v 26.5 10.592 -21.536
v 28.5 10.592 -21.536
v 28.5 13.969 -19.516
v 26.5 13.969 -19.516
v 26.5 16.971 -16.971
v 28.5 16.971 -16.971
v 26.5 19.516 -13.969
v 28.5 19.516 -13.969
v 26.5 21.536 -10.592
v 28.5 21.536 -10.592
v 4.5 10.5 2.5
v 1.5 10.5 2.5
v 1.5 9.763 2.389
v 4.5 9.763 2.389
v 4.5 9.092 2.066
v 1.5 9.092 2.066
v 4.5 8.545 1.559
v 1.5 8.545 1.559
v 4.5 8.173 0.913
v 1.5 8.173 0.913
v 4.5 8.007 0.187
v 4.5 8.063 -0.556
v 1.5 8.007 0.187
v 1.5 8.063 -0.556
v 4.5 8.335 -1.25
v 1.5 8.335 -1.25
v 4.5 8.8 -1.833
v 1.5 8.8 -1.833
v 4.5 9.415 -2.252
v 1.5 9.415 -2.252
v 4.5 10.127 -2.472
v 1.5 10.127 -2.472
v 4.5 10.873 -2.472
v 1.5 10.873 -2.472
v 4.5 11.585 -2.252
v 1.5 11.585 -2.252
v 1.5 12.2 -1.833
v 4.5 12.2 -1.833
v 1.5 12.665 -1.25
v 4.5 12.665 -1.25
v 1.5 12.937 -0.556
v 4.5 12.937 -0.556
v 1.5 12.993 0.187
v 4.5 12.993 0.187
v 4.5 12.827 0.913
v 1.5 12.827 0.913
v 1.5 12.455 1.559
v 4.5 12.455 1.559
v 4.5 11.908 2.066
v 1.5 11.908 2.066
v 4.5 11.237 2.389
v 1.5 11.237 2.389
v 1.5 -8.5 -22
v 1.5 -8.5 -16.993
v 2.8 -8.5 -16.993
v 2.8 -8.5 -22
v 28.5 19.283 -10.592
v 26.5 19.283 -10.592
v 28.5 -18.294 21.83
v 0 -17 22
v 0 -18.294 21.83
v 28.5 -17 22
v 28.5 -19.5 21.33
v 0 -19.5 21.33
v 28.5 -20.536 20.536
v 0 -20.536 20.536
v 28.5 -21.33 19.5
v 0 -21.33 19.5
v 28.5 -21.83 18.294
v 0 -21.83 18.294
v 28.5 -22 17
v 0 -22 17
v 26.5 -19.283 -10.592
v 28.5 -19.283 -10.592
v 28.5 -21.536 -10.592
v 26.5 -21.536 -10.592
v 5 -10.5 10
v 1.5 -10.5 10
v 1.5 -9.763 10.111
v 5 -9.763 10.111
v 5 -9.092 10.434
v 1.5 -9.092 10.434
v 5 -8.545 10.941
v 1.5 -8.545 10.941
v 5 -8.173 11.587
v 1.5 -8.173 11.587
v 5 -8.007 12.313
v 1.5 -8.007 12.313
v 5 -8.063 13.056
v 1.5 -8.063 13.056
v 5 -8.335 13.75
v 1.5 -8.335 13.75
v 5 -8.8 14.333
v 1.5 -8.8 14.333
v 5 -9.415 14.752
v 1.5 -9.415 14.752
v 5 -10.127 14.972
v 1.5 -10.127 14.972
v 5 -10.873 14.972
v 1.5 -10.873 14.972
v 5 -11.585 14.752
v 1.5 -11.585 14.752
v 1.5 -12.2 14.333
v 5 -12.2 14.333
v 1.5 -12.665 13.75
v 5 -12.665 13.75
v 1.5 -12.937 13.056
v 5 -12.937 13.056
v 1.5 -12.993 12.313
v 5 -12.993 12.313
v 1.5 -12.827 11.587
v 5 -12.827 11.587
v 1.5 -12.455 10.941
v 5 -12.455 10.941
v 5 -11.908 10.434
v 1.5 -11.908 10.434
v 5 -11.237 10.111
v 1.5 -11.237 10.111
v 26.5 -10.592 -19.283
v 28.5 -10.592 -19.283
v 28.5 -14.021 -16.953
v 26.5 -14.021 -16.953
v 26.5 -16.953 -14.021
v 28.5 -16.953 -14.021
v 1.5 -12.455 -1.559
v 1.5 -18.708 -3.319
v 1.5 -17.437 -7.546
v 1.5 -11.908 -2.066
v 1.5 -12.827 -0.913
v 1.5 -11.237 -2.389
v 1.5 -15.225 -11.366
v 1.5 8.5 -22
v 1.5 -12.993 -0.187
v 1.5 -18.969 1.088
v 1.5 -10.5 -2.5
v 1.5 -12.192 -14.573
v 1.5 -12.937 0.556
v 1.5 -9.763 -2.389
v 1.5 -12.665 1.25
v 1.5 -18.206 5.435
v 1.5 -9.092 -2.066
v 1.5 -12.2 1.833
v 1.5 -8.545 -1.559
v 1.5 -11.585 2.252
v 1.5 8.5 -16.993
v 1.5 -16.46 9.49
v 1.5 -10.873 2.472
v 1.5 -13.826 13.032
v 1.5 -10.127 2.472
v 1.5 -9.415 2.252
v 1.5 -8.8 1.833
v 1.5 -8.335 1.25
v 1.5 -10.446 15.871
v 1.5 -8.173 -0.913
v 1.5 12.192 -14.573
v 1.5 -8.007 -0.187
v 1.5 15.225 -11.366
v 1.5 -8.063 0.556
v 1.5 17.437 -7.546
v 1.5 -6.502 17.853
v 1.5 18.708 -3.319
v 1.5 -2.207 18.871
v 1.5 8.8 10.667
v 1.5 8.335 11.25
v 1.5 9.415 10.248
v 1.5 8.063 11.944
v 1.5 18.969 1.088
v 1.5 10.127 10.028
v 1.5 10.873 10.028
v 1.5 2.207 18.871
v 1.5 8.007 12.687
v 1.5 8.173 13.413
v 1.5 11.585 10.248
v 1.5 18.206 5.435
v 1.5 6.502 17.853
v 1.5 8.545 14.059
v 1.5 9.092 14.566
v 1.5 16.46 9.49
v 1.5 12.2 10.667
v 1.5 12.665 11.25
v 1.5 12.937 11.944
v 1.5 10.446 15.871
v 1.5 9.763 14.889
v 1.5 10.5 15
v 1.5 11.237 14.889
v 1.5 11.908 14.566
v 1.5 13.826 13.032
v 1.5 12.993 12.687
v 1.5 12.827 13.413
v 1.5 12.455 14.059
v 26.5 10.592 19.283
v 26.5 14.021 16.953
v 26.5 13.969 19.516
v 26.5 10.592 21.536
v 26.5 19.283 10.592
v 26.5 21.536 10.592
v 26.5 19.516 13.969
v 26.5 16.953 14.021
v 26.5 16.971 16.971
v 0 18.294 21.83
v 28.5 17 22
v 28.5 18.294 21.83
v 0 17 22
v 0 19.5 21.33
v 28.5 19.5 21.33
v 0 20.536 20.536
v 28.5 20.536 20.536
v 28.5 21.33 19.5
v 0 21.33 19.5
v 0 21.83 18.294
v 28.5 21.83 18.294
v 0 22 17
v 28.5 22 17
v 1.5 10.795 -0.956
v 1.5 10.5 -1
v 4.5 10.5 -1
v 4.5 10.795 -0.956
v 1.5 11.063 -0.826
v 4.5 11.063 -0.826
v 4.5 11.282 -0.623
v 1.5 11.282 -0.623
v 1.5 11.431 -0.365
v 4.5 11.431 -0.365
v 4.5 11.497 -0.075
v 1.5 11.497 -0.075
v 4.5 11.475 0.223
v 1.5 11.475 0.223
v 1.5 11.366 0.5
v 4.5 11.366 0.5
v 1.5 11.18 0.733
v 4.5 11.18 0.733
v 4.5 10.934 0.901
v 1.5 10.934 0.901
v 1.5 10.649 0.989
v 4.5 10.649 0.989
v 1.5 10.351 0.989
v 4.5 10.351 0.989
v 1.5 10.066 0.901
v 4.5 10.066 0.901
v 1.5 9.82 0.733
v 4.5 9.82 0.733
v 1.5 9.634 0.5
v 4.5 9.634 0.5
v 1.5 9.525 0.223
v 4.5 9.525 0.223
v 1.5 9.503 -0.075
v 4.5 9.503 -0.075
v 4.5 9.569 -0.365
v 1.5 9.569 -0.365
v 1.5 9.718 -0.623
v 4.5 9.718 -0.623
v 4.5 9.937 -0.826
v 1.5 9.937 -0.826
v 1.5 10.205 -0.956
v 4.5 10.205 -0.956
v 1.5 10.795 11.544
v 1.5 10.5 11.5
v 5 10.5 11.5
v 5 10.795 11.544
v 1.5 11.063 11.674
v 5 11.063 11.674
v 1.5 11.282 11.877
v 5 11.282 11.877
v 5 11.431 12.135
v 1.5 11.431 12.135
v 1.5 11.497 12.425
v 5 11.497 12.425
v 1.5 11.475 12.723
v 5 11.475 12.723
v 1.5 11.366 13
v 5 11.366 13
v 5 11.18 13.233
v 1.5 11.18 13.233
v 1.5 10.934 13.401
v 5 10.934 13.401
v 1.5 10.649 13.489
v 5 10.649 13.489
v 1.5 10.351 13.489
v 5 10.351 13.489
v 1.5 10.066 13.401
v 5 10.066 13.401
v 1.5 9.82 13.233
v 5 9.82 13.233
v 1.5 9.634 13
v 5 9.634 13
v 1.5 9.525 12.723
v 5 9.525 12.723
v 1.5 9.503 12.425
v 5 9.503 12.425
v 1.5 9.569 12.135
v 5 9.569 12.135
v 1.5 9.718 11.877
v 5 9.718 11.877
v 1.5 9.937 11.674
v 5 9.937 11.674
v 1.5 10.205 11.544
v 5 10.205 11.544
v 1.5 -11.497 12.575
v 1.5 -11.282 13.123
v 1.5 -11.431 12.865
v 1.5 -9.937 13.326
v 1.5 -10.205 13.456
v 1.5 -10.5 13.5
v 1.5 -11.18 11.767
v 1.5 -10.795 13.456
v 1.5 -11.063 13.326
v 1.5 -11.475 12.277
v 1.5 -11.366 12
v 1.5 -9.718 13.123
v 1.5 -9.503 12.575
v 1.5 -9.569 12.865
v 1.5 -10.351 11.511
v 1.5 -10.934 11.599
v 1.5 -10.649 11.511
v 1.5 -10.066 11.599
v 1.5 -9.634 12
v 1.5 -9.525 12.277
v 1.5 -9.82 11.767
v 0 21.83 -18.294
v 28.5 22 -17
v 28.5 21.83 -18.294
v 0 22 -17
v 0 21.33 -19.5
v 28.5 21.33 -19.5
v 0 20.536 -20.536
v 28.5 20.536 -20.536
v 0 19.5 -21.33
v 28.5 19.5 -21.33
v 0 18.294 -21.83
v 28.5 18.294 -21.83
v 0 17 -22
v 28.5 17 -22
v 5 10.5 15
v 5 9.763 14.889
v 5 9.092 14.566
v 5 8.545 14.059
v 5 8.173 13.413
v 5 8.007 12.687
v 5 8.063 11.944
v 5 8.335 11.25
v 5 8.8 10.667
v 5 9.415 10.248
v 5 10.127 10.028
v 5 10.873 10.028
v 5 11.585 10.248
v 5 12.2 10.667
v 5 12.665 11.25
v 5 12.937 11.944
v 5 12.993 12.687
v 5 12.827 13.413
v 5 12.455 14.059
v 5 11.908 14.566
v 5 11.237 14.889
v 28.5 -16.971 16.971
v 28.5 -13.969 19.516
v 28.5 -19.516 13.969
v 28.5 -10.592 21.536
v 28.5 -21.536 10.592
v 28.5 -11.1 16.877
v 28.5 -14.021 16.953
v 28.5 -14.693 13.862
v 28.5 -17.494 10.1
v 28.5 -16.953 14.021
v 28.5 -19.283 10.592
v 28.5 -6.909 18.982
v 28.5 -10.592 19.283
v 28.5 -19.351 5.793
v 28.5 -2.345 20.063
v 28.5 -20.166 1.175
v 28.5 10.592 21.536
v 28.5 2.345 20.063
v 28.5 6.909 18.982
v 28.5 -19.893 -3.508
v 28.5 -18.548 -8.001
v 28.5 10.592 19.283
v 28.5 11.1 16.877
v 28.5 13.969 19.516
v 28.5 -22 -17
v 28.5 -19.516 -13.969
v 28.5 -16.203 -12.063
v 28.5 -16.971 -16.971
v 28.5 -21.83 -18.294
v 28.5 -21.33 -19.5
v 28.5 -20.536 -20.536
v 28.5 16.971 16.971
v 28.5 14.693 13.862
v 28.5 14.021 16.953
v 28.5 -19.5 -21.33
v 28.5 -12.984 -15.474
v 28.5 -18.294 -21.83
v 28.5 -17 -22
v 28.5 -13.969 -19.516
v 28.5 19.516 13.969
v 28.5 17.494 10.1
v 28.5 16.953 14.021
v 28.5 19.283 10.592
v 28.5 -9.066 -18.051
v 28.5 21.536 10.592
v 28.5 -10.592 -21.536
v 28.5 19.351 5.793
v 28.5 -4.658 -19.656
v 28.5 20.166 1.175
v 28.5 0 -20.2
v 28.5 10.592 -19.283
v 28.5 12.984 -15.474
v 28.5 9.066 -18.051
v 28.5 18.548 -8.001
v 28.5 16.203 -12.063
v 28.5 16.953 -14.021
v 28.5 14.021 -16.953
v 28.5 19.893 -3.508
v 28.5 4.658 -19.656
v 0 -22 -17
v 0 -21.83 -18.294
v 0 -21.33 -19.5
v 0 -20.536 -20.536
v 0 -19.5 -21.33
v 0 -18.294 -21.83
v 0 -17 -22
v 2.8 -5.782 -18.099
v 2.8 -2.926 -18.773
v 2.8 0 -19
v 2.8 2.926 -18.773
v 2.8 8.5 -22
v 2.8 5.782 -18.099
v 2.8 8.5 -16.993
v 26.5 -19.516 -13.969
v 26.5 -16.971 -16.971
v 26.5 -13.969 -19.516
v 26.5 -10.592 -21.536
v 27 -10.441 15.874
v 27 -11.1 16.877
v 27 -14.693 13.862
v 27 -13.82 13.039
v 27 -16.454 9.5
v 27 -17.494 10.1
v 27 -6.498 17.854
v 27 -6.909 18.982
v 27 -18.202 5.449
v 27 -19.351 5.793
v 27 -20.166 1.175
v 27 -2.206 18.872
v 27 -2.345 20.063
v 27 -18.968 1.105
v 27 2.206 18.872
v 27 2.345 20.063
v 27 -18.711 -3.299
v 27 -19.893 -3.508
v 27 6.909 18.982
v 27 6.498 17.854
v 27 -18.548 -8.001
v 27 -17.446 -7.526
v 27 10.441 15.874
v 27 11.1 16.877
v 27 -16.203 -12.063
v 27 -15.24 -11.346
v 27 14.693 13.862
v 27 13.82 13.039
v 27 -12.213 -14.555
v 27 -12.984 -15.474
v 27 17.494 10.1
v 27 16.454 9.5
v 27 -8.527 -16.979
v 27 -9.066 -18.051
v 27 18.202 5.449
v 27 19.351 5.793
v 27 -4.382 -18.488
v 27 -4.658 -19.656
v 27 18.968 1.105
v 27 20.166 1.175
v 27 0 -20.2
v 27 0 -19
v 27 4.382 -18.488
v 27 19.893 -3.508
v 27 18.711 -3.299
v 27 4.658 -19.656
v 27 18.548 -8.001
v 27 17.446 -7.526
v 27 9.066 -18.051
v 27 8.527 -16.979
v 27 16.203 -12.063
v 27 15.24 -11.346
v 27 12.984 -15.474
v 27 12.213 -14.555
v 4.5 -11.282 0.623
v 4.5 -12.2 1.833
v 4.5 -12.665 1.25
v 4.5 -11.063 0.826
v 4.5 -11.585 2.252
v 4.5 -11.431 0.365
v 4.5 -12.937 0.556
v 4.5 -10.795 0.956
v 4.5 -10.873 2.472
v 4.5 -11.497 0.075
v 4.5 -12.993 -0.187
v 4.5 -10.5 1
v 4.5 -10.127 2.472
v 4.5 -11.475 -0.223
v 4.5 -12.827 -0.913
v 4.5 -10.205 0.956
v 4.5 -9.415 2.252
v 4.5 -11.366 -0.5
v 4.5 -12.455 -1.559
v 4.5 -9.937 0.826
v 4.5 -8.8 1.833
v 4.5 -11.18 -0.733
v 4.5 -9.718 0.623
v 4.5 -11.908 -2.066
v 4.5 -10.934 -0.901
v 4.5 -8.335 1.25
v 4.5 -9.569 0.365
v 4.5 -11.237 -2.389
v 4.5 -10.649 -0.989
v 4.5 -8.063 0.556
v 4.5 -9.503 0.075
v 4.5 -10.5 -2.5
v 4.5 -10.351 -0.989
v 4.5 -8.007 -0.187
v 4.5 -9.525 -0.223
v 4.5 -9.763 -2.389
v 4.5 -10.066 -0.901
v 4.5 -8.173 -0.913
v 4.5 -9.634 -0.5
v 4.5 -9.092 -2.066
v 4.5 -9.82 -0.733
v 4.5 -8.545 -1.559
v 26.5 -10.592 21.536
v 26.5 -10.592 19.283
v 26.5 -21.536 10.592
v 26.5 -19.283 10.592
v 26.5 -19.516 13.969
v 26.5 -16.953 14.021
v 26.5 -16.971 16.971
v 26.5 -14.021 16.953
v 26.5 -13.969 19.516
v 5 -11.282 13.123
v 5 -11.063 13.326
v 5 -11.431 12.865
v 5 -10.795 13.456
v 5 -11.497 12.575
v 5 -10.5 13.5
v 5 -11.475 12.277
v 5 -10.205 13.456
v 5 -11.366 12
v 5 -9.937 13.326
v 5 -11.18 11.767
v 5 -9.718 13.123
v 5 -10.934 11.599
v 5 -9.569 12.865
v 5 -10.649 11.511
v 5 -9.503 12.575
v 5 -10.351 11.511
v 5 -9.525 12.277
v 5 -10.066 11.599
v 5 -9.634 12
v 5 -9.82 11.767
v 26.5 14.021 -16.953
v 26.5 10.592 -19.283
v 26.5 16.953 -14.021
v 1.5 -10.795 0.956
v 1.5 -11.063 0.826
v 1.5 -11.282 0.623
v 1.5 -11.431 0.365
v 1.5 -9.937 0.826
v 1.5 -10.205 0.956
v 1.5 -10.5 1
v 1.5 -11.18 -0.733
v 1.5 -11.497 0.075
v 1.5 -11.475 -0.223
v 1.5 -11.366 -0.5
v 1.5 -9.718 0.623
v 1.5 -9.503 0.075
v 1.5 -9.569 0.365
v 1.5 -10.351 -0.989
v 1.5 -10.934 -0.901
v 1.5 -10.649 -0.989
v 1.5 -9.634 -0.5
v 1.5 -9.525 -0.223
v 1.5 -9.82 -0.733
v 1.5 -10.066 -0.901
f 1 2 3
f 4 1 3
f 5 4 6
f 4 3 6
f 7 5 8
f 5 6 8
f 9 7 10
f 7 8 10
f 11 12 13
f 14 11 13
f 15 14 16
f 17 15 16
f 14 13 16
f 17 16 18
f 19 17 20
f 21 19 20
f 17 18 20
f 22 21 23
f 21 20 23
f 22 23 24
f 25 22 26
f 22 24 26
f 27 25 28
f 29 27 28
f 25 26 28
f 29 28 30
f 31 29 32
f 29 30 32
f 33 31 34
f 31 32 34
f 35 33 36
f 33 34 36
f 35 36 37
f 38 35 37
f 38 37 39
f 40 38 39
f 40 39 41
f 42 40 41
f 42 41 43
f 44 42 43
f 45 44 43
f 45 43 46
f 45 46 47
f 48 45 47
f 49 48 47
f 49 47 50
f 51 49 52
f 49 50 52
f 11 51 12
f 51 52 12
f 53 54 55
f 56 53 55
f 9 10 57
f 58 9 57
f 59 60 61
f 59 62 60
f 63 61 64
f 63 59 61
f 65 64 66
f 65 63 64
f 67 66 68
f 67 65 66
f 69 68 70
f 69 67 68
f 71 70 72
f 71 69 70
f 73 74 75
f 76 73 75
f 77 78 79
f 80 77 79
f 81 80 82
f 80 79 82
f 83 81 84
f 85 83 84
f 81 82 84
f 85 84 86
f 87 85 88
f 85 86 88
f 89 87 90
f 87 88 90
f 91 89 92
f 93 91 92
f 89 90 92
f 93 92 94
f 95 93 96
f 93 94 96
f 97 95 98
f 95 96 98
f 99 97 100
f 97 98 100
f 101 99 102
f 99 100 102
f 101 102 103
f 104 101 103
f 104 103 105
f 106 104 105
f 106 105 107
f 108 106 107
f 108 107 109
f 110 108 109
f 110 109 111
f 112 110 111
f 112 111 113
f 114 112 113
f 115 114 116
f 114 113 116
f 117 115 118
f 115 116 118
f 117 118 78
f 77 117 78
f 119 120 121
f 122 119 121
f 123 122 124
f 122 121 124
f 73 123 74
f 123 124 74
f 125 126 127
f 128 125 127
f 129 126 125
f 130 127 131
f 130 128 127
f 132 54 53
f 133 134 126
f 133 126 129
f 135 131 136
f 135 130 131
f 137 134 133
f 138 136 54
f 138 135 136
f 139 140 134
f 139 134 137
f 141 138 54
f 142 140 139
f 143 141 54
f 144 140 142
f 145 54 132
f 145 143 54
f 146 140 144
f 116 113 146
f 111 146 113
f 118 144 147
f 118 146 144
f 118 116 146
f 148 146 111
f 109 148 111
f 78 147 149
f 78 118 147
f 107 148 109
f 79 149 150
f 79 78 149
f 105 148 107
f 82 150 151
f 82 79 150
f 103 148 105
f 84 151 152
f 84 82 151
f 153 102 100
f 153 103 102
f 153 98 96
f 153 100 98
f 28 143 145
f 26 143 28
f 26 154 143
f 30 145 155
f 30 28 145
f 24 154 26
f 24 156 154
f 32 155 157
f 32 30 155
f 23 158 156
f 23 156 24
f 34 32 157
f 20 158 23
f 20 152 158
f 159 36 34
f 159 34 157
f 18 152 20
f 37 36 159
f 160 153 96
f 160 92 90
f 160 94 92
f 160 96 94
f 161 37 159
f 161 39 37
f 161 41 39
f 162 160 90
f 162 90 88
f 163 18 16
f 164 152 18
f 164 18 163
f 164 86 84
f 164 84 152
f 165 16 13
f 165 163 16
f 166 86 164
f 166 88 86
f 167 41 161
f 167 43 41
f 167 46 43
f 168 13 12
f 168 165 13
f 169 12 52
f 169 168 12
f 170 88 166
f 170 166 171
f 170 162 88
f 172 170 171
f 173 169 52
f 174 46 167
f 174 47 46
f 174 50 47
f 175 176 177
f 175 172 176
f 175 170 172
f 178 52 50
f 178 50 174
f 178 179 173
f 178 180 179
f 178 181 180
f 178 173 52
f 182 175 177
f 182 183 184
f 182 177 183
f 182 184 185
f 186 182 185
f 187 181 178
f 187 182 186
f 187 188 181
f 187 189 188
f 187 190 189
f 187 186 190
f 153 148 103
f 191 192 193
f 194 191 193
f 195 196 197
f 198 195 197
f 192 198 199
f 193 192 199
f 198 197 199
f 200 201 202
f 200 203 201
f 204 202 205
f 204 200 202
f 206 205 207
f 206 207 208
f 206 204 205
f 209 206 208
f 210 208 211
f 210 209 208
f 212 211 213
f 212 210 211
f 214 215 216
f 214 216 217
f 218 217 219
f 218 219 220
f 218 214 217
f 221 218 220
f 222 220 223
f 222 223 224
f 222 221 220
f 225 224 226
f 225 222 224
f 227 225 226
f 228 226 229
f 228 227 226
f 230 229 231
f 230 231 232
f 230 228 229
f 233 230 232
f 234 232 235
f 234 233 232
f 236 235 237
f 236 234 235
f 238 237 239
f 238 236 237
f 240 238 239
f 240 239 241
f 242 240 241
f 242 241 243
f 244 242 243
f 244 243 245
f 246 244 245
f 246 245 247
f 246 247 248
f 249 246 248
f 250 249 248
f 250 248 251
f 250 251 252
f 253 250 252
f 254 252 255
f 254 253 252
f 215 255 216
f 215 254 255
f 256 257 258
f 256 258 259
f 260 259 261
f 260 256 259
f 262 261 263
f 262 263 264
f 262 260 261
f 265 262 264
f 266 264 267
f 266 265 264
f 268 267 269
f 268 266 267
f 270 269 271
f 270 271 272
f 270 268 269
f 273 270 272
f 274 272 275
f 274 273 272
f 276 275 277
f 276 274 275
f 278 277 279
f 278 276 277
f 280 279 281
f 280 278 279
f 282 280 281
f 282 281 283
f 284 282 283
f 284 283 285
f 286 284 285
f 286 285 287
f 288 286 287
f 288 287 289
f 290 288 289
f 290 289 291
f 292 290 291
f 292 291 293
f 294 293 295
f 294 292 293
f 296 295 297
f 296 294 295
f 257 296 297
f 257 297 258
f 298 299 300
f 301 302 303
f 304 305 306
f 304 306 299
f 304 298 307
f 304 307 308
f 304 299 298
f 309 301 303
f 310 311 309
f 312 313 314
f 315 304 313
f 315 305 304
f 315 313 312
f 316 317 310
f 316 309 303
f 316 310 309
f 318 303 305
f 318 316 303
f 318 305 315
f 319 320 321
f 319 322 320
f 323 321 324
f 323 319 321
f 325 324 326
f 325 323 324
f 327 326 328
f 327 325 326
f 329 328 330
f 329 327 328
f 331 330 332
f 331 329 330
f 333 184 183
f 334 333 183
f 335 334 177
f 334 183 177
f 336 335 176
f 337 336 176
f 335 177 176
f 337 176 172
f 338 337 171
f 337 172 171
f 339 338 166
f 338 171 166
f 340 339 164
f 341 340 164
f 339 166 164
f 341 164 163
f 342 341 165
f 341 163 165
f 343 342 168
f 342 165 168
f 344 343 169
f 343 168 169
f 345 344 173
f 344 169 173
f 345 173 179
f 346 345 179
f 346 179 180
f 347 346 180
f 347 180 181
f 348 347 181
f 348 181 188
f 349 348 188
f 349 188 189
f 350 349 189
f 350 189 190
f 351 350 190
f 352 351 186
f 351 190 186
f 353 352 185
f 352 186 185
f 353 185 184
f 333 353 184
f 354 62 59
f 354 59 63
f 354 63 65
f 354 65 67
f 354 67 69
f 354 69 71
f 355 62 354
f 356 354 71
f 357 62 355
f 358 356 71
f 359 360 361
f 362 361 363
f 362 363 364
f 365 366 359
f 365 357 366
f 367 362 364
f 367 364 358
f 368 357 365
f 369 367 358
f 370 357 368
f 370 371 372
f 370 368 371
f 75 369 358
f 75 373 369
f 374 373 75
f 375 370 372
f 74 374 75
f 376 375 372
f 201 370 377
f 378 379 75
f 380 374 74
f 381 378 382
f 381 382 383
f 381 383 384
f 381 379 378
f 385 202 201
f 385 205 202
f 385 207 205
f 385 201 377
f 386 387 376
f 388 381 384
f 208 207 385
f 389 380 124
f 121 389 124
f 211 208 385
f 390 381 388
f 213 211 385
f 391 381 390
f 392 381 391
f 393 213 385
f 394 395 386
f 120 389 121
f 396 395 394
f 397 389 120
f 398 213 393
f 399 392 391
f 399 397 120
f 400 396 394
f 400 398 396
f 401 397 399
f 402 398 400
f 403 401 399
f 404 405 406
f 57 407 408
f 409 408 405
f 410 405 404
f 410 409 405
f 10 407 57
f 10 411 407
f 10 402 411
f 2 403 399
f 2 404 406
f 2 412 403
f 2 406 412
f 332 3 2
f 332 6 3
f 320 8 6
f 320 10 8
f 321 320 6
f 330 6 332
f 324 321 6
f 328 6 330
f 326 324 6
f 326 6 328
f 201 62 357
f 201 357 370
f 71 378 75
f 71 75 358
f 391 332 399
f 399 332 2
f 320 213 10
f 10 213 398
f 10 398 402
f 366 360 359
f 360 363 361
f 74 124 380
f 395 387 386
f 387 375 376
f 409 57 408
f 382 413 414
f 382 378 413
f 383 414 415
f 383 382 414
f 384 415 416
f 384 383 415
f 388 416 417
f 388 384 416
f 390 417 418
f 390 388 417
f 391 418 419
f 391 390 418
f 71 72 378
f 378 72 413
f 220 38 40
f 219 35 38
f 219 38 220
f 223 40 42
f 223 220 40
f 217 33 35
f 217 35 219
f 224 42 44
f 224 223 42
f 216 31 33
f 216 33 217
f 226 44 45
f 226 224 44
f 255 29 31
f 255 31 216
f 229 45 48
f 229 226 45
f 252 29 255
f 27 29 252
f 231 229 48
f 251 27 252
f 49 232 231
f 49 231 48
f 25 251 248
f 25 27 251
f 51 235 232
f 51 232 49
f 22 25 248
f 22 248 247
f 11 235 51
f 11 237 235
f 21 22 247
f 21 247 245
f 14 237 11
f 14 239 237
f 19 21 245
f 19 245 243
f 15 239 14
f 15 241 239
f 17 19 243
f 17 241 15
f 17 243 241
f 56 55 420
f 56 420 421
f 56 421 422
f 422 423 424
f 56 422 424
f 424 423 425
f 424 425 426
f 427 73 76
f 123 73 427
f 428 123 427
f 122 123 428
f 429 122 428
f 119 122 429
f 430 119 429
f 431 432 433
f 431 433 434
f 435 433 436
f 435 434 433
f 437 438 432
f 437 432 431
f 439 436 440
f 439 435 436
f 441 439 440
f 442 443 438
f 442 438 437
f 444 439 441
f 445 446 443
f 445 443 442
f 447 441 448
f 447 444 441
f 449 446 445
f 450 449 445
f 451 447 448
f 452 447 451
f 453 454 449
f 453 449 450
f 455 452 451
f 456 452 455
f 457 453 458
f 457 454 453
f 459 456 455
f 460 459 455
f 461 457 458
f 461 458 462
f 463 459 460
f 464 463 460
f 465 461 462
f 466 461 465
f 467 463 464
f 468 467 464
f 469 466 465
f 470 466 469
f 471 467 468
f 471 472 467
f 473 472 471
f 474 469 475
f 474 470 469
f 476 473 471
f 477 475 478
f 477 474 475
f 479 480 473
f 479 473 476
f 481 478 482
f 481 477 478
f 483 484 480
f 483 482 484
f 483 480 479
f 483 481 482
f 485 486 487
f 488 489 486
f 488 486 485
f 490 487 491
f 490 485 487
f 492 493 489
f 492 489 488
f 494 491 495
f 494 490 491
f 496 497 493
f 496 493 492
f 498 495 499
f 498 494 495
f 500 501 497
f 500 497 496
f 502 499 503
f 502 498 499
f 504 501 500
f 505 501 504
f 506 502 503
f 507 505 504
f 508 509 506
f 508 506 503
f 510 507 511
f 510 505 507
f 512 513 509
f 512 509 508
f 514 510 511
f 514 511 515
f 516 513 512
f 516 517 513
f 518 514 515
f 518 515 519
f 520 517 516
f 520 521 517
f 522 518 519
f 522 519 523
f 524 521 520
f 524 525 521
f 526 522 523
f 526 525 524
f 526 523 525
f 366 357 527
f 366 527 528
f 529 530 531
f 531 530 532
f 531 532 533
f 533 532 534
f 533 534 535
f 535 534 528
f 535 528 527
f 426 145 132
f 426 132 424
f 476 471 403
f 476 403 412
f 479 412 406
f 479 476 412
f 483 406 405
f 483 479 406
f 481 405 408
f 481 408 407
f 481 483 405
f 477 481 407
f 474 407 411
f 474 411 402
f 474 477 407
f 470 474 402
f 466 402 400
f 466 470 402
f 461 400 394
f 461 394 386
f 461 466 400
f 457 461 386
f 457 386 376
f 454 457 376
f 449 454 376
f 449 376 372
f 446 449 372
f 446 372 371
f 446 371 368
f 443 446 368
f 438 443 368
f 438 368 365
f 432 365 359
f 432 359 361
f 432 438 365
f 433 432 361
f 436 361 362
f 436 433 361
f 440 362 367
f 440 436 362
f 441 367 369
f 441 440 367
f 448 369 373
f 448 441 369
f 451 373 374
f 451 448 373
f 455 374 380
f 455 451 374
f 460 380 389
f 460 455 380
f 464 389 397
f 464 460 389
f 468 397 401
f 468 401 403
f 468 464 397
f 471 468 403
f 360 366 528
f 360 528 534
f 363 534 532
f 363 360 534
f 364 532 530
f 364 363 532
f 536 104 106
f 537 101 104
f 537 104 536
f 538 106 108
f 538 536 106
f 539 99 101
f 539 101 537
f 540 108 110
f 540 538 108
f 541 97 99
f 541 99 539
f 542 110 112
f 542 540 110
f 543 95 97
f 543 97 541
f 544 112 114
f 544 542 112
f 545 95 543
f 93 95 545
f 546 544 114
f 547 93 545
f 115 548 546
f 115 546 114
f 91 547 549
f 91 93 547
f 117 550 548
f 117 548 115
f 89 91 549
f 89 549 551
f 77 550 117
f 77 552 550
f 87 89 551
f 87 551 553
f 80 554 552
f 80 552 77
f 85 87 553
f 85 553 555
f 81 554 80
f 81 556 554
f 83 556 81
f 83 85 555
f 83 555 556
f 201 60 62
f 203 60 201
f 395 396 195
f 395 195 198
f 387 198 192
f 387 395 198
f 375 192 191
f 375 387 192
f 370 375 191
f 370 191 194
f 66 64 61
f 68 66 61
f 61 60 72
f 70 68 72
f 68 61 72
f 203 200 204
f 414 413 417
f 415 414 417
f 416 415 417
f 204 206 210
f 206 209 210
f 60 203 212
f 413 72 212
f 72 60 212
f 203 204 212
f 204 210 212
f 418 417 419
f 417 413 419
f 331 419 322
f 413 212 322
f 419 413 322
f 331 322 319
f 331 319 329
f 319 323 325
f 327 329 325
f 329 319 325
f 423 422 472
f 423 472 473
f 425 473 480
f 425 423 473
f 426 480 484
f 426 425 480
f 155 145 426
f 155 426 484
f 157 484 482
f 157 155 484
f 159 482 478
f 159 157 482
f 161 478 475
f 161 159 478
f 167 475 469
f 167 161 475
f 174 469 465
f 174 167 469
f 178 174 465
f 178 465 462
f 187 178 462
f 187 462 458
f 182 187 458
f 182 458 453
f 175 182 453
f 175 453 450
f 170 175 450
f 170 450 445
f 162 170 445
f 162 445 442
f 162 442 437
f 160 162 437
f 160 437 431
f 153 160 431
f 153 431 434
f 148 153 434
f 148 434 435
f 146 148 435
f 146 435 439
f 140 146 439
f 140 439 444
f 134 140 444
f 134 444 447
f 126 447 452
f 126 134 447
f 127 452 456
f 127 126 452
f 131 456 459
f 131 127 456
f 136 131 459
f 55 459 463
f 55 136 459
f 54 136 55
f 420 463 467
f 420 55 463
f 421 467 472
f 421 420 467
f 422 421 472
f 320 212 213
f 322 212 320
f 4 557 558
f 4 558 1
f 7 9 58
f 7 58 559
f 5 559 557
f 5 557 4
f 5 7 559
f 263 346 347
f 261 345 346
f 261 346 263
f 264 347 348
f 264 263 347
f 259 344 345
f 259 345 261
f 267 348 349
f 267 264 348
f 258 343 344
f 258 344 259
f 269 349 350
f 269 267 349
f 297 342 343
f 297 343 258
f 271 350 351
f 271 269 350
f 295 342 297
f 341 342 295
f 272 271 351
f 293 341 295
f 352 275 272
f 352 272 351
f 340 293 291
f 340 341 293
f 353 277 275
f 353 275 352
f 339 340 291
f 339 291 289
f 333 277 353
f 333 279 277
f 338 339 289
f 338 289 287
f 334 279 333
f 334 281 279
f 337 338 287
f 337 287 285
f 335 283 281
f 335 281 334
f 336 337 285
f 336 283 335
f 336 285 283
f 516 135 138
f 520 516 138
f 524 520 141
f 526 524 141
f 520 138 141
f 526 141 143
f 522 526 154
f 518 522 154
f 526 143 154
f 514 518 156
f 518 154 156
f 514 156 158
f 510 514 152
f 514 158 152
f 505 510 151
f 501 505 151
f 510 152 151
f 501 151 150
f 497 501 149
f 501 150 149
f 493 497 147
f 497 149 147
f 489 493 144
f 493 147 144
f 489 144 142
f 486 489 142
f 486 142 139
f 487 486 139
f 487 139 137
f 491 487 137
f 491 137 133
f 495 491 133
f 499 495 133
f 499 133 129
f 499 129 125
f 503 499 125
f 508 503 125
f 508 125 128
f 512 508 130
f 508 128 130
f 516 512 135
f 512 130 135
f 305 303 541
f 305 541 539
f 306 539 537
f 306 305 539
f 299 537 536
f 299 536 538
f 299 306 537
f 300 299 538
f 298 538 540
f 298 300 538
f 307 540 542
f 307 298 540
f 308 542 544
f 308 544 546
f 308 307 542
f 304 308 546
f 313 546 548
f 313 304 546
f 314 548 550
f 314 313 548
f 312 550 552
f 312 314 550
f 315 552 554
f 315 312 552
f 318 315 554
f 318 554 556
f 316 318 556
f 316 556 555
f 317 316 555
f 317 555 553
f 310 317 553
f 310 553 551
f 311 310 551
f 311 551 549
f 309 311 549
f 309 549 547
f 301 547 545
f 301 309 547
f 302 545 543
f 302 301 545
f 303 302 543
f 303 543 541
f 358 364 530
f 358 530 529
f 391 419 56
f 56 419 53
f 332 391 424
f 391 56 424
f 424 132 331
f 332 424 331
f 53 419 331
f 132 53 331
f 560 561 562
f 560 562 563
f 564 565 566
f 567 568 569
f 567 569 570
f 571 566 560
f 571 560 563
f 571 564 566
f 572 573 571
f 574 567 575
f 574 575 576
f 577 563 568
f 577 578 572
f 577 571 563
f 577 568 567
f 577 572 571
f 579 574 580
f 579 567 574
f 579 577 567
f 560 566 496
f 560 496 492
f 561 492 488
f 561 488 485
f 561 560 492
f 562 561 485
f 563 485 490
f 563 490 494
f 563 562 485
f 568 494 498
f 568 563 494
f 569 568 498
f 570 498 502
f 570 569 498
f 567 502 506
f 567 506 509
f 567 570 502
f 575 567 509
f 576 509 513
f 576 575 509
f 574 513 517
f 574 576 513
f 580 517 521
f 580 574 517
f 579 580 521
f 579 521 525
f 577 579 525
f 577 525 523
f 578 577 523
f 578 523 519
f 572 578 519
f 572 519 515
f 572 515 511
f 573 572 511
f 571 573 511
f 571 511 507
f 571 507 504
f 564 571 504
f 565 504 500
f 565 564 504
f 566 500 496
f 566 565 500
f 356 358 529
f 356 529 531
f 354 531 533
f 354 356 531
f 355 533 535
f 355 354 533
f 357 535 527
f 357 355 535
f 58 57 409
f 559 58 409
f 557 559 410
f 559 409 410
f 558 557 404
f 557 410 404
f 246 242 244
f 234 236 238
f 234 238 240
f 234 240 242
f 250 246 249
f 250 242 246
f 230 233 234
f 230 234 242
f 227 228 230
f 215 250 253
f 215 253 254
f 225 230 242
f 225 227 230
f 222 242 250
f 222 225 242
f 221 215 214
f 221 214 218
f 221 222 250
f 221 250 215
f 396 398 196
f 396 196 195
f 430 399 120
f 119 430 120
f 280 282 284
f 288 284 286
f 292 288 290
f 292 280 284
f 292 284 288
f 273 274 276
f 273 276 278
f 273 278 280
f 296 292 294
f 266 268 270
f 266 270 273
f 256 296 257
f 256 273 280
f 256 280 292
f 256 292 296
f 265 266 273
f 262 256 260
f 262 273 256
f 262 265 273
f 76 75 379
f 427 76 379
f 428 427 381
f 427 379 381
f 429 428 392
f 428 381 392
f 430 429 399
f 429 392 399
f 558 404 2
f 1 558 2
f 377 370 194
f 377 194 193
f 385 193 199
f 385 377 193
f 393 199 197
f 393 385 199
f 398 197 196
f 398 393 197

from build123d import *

# Parameters (mm, degrees)
SKETCH_1_W          = 44
SKETCH_1_H          = 44
EXTRUDE_1_DEPTH     = 1.5
SKETCH_2_R          = 2.5
SKETCH_2_R_2        = 1
EXTRUDE_2_DEPTH     = 3
SKETCH_3_R          = 2.5
SKETCH_3_R_2        = 1
EXTRUDE_3_DEPTH     = 3.5
SKETCH_4_W          = 44
SKETCH_4_H          = 44
SKETCH_4_R          = 19
EXTRUDE_4_DEPTH     = 27
CUT_EXTRUDE_START   = -1.5
SKETCH_5_R          = 20.2
SKETCH_5_R_2        = 19
CUT_EXTRUDE_1_DEPTH = 1.5
FILLET_2_R          = 5
CUT_EXTRUDE_START_2 = -10
SKETCH_10_W         = 1.3
SKETCH_10_H         = 17
CUT_EXTRUDE_5_DEPTH = 33.1930089
CUT_EXTRUDE_7_DEPTH = 2


with BuildPart() as part:
    # 草图1 → 凸台-拉伸1 (new body)
    with BuildSketch(Plane(origin=(0, 0, 0), x_dir=(0, 0, -1), z_dir=(1, 0, 0))):
        Rectangle(SKETCH_1_W, SKETCH_1_H)
    extrude(amount=EXTRUDE_1_DEPTH)

    # 草图2 → 凸台-拉伸2 (add)
    # profile 1 of 2: a face of its own
    with BuildSketch(Plane(origin=(1.5, 0, 0), x_dir=(0, 0, -1), z_dir=(1, 0, 0))):
        with Locations((0, -10.5)):
            Circle(SKETCH_2_R)
        with Locations((0, -10.5)):
            Circle(SKETCH_2_R_2, mode=Mode.SUBTRACT)
    # profile 2 of 2: a face of its own
    with BuildSketch(Plane(origin=(1.5, 0, 0), x_dir=(0, 0, -1), z_dir=(1, 0, 0))):
        with Locations((0, 10.5)):
            Circle(SKETCH_2_R)
        with Locations((0, 10.5)):
            Circle(SKETCH_2_R_2, mode=Mode.SUBTRACT)
    extrude(amount=EXTRUDE_2_DEPTH)

    # 草图3 → 凸台-拉伸3 (add)
    # profile 1 of 2: a face of its own
    with BuildSketch(Plane(origin=(1.5, 0, 0), x_dir=(0, 0, -1), z_dir=(1, 0, 0))):
        with Locations((-12.5, -10.5)):
            Circle(SKETCH_3_R)
        with Locations((-12.5, -10.5)):
            Circle(SKETCH_3_R_2, mode=Mode.SUBTRACT)
    # profile 2 of 2: a face of its own
    with BuildSketch(Plane(origin=(1.5, 0, 0), x_dir=(0, 0, -1), z_dir=(1, 0, 0))):
        with Locations((-12.5, 10.5)):
            Circle(SKETCH_3_R)
        with Locations((-12.5, 10.5)):
            Circle(SKETCH_3_R_2, mode=Mode.SUBTRACT)
    extrude(amount=EXTRUDE_3_DEPTH)

    # 草图4 → 凸台-拉伸4 (add)
    with BuildSketch(Plane(origin=(1.5, 0, 0), x_dir=(0, 0, -1), z_dir=(1, 0, 0))):
        Rectangle(SKETCH_4_W, SKETCH_4_H)
        Circle(SKETCH_4_R, mode=Mode.SUBTRACT)
    extrude(amount=EXTRUDE_4_DEPTH)

    # 草图5 → 切除-拉伸1 (cut)
    with BuildSketch(Plane(origin=(28.5, 0, 0), x_dir=(0, 0, -1), z_dir=(1, 0, 0)).offset(CUT_EXTRUDE_START)):
        Circle(SKETCH_5_R)
        Circle(SKETCH_5_R_2, mode=Mode.SUBTRACT)
    extrude(amount=CUT_EXTRUDE_1_DEPTH, mode=Mode.SUBTRACT)

    # 圆角2
    fillet_2_edges = [part.edges().sort_by_distance(p)[0] for p in [
        (14.25, -22, 22),
        (14.25, -22, -22),
        (14.25, 22, -22),
        (14.25, 22, 22),
    ]]
    fillet(fillet_2_edges, radius=FILLET_2_R)

    # 草图10 → 切除-拉伸5 (cut, through all)
    with BuildSketch(Plane.XY.offset(CUT_EXTRUDE_START_2)):
        with Locations((2.15, 0)):
            Rectangle(SKETCH_10_W, SKETCH_10_H)
    extrude(amount=-CUT_EXTRUDE_5_DEPTH, mode=Mode.SUBTRACT)

    # 草图13 → 切除-拉伸7 (cut)
    with BuildSketch(Plane(origin=(28.5, 0, 0), x_dir=(0, 0, -1), z_dir=(1, 0, 0))):
        with BuildLine():
            Line((-10.591663047, 21.536403458), (-10.591663047, 19.282548429))
            ThreePointArc((-10.591663047, 19.282548429), (-15.556349186, 15.556349186), (-19.282548429, 10.591663047))
            Line((-19.282548429, 10.591663047), (-21.536403458, 10.591663047))
            ThreePointArc((-21.536403458, 10.591663047), (-16.970562748, 16.970562748), (-10.591663047, 21.536403458))
        make_face()
        with BuildLine():
            Line((10.591663047, 21.536403458), (10.591663047, 19.282548429))
            ThreePointArc((10.591663047, 19.282548429), (15.556349186, 15.556349186), (19.282548429, 10.591663047))
            Line((19.282548429, 10.591663047), (21.536403458, 10.591663047))
            ThreePointArc((21.536403458, 10.591663047), (16.970562748, 16.970562748), (10.591663047, 21.536403458))
        make_face()
        with BuildLine():
            Line((-21.536403458, -10.591663047), (-19.282548429, -10.591663047))
            ThreePointArc((-19.282548429, -10.591663047), (-15.556349186, -15.556349186), (-10.591663047, -19.282548429))
            Line((-10.591663047, -19.282548429), (-10.591663047, -21.536403458))
            ThreePointArc((-10.591663047, -21.536403458), (-16.970562748, -16.970562748), (-21.536403458, -10.591663047))
        make_face()
        with BuildLine():
            Line((21.536403458, -10.591663047), (19.282548429, -10.591663047))
            ThreePointArc((19.282548429, -10.591663047), (15.556349186, -15.556349186), (10.591663047, -19.282548429))
            Line((10.591663047, -19.282548429), (10.591663047, -21.536403458))
            ThreePointArc((10.591663047, -21.536403458), (16.970562748, -16.970562748), (21.536403458, -10.591663047))
        make_face()
    extrude(amount=-CUT_EXTRUDE_7_DEPTH, mode=Mode.SUBTRACT)


solid = part.part
